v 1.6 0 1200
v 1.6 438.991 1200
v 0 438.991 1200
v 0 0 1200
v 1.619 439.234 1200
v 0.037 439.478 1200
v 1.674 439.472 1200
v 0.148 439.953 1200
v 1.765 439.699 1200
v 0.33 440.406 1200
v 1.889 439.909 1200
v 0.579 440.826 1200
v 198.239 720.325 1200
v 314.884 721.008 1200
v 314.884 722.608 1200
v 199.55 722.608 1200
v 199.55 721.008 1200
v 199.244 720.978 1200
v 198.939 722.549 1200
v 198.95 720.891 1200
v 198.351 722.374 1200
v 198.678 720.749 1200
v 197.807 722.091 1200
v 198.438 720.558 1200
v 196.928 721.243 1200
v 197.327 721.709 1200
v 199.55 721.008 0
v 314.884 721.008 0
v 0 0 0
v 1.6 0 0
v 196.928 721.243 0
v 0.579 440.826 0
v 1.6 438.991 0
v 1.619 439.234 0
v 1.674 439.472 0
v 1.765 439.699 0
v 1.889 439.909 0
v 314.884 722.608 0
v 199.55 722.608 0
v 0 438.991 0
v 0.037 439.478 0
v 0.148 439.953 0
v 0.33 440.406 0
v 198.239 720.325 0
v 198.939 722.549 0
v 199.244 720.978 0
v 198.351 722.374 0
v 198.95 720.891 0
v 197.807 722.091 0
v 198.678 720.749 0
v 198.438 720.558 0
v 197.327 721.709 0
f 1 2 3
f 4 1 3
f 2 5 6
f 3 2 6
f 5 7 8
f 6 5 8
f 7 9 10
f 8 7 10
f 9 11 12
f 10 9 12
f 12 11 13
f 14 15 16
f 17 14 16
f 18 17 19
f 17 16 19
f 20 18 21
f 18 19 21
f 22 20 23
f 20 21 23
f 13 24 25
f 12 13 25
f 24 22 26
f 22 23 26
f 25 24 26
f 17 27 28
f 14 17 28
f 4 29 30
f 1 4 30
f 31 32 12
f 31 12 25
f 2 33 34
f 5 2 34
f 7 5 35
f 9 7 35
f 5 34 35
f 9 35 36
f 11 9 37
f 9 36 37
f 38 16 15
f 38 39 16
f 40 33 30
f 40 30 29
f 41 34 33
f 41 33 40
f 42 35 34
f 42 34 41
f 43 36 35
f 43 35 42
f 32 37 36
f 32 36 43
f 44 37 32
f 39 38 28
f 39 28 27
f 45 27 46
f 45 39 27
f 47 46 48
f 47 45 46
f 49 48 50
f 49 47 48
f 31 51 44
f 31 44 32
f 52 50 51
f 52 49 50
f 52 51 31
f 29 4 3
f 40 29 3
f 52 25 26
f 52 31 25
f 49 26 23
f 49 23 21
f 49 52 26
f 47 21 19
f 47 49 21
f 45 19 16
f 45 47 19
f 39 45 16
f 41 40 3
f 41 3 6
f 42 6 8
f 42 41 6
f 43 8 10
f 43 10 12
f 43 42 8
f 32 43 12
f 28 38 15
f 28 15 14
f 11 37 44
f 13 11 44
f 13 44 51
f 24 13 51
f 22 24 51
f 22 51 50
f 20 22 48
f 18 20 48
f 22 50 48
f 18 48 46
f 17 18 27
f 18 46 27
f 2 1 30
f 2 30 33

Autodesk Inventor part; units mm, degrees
ref_plane "YZ Plane" through (0, 0, 0) normal (1, 0, 0) x (0, 1, 0)
ref_plane "XZ Plane" through (0, 0, 0) normal (0, 1, 0) x (-1, 0, 0)
ref_plane "XY Plane" through (0, 0, 0) normal (0, 0, 1) x (1, 0, 0)
sketch "Sketch1" plane through (0, 0, 0) normal (0, 0, 1) x (1, 0, 0)
  line L0 (0, 0) -> (0, 440)
  line L1 (0, 440) -> (197.8839, 722.6075)
  line L2 (197.8839, 722.6075) -> (314.8839, 722.6075)
  dimension "d0" = 440
  dimension "d1" = 345
  dimension "d2" = 145
  dimension "d3" = 117
contour flange "Contour Flange1" sketch "Sketch1" thickness 1.6 bend radius 1.6 width 1200 along (0, 0, 1) mid plane no both sides no wall seen from (0, 220, 0) lies toward (1, 0, 0) curves L0 L1 L2
bend "Bend1"
corner "Corner1"
equation "\"d4\" = Thickness"
equation "\"d5\" = BendReliefWidth"
equation "\"d6\" = BendReliefDepth"
equation "\"d7\" = MinimumRemnant"
equation "\"d8\" = TransitionRadius"
equation "\"d10\" = BendRadius"
equation "\"d12\" = CornerReliefSize"
equation "\"d13\" = GapSize"
equation "\"d14\" = JacobiRadiusSize"
equation "\"BendRadius\" = Thickness"
equation "\"BendReliefWidth\" = Thickness"
equation "\"BendReliefDepth\" = 0.5 * Thickness"
equation "\"CornerReliefSize\" = 4 * Thickness"
equation "\"MinimumRemnant\" = 2 * Thickness"
equation "\"TransitionRadius\" = BendRadius"
equation "\"JacobiRadiusSize\" = BendRadius"
equation "\"GapSize\" = Thickness"
equation "\"Thickness\" = 1.6"
properties part number "Cover Front Witrh Center Point" material "Stainless Steel"
